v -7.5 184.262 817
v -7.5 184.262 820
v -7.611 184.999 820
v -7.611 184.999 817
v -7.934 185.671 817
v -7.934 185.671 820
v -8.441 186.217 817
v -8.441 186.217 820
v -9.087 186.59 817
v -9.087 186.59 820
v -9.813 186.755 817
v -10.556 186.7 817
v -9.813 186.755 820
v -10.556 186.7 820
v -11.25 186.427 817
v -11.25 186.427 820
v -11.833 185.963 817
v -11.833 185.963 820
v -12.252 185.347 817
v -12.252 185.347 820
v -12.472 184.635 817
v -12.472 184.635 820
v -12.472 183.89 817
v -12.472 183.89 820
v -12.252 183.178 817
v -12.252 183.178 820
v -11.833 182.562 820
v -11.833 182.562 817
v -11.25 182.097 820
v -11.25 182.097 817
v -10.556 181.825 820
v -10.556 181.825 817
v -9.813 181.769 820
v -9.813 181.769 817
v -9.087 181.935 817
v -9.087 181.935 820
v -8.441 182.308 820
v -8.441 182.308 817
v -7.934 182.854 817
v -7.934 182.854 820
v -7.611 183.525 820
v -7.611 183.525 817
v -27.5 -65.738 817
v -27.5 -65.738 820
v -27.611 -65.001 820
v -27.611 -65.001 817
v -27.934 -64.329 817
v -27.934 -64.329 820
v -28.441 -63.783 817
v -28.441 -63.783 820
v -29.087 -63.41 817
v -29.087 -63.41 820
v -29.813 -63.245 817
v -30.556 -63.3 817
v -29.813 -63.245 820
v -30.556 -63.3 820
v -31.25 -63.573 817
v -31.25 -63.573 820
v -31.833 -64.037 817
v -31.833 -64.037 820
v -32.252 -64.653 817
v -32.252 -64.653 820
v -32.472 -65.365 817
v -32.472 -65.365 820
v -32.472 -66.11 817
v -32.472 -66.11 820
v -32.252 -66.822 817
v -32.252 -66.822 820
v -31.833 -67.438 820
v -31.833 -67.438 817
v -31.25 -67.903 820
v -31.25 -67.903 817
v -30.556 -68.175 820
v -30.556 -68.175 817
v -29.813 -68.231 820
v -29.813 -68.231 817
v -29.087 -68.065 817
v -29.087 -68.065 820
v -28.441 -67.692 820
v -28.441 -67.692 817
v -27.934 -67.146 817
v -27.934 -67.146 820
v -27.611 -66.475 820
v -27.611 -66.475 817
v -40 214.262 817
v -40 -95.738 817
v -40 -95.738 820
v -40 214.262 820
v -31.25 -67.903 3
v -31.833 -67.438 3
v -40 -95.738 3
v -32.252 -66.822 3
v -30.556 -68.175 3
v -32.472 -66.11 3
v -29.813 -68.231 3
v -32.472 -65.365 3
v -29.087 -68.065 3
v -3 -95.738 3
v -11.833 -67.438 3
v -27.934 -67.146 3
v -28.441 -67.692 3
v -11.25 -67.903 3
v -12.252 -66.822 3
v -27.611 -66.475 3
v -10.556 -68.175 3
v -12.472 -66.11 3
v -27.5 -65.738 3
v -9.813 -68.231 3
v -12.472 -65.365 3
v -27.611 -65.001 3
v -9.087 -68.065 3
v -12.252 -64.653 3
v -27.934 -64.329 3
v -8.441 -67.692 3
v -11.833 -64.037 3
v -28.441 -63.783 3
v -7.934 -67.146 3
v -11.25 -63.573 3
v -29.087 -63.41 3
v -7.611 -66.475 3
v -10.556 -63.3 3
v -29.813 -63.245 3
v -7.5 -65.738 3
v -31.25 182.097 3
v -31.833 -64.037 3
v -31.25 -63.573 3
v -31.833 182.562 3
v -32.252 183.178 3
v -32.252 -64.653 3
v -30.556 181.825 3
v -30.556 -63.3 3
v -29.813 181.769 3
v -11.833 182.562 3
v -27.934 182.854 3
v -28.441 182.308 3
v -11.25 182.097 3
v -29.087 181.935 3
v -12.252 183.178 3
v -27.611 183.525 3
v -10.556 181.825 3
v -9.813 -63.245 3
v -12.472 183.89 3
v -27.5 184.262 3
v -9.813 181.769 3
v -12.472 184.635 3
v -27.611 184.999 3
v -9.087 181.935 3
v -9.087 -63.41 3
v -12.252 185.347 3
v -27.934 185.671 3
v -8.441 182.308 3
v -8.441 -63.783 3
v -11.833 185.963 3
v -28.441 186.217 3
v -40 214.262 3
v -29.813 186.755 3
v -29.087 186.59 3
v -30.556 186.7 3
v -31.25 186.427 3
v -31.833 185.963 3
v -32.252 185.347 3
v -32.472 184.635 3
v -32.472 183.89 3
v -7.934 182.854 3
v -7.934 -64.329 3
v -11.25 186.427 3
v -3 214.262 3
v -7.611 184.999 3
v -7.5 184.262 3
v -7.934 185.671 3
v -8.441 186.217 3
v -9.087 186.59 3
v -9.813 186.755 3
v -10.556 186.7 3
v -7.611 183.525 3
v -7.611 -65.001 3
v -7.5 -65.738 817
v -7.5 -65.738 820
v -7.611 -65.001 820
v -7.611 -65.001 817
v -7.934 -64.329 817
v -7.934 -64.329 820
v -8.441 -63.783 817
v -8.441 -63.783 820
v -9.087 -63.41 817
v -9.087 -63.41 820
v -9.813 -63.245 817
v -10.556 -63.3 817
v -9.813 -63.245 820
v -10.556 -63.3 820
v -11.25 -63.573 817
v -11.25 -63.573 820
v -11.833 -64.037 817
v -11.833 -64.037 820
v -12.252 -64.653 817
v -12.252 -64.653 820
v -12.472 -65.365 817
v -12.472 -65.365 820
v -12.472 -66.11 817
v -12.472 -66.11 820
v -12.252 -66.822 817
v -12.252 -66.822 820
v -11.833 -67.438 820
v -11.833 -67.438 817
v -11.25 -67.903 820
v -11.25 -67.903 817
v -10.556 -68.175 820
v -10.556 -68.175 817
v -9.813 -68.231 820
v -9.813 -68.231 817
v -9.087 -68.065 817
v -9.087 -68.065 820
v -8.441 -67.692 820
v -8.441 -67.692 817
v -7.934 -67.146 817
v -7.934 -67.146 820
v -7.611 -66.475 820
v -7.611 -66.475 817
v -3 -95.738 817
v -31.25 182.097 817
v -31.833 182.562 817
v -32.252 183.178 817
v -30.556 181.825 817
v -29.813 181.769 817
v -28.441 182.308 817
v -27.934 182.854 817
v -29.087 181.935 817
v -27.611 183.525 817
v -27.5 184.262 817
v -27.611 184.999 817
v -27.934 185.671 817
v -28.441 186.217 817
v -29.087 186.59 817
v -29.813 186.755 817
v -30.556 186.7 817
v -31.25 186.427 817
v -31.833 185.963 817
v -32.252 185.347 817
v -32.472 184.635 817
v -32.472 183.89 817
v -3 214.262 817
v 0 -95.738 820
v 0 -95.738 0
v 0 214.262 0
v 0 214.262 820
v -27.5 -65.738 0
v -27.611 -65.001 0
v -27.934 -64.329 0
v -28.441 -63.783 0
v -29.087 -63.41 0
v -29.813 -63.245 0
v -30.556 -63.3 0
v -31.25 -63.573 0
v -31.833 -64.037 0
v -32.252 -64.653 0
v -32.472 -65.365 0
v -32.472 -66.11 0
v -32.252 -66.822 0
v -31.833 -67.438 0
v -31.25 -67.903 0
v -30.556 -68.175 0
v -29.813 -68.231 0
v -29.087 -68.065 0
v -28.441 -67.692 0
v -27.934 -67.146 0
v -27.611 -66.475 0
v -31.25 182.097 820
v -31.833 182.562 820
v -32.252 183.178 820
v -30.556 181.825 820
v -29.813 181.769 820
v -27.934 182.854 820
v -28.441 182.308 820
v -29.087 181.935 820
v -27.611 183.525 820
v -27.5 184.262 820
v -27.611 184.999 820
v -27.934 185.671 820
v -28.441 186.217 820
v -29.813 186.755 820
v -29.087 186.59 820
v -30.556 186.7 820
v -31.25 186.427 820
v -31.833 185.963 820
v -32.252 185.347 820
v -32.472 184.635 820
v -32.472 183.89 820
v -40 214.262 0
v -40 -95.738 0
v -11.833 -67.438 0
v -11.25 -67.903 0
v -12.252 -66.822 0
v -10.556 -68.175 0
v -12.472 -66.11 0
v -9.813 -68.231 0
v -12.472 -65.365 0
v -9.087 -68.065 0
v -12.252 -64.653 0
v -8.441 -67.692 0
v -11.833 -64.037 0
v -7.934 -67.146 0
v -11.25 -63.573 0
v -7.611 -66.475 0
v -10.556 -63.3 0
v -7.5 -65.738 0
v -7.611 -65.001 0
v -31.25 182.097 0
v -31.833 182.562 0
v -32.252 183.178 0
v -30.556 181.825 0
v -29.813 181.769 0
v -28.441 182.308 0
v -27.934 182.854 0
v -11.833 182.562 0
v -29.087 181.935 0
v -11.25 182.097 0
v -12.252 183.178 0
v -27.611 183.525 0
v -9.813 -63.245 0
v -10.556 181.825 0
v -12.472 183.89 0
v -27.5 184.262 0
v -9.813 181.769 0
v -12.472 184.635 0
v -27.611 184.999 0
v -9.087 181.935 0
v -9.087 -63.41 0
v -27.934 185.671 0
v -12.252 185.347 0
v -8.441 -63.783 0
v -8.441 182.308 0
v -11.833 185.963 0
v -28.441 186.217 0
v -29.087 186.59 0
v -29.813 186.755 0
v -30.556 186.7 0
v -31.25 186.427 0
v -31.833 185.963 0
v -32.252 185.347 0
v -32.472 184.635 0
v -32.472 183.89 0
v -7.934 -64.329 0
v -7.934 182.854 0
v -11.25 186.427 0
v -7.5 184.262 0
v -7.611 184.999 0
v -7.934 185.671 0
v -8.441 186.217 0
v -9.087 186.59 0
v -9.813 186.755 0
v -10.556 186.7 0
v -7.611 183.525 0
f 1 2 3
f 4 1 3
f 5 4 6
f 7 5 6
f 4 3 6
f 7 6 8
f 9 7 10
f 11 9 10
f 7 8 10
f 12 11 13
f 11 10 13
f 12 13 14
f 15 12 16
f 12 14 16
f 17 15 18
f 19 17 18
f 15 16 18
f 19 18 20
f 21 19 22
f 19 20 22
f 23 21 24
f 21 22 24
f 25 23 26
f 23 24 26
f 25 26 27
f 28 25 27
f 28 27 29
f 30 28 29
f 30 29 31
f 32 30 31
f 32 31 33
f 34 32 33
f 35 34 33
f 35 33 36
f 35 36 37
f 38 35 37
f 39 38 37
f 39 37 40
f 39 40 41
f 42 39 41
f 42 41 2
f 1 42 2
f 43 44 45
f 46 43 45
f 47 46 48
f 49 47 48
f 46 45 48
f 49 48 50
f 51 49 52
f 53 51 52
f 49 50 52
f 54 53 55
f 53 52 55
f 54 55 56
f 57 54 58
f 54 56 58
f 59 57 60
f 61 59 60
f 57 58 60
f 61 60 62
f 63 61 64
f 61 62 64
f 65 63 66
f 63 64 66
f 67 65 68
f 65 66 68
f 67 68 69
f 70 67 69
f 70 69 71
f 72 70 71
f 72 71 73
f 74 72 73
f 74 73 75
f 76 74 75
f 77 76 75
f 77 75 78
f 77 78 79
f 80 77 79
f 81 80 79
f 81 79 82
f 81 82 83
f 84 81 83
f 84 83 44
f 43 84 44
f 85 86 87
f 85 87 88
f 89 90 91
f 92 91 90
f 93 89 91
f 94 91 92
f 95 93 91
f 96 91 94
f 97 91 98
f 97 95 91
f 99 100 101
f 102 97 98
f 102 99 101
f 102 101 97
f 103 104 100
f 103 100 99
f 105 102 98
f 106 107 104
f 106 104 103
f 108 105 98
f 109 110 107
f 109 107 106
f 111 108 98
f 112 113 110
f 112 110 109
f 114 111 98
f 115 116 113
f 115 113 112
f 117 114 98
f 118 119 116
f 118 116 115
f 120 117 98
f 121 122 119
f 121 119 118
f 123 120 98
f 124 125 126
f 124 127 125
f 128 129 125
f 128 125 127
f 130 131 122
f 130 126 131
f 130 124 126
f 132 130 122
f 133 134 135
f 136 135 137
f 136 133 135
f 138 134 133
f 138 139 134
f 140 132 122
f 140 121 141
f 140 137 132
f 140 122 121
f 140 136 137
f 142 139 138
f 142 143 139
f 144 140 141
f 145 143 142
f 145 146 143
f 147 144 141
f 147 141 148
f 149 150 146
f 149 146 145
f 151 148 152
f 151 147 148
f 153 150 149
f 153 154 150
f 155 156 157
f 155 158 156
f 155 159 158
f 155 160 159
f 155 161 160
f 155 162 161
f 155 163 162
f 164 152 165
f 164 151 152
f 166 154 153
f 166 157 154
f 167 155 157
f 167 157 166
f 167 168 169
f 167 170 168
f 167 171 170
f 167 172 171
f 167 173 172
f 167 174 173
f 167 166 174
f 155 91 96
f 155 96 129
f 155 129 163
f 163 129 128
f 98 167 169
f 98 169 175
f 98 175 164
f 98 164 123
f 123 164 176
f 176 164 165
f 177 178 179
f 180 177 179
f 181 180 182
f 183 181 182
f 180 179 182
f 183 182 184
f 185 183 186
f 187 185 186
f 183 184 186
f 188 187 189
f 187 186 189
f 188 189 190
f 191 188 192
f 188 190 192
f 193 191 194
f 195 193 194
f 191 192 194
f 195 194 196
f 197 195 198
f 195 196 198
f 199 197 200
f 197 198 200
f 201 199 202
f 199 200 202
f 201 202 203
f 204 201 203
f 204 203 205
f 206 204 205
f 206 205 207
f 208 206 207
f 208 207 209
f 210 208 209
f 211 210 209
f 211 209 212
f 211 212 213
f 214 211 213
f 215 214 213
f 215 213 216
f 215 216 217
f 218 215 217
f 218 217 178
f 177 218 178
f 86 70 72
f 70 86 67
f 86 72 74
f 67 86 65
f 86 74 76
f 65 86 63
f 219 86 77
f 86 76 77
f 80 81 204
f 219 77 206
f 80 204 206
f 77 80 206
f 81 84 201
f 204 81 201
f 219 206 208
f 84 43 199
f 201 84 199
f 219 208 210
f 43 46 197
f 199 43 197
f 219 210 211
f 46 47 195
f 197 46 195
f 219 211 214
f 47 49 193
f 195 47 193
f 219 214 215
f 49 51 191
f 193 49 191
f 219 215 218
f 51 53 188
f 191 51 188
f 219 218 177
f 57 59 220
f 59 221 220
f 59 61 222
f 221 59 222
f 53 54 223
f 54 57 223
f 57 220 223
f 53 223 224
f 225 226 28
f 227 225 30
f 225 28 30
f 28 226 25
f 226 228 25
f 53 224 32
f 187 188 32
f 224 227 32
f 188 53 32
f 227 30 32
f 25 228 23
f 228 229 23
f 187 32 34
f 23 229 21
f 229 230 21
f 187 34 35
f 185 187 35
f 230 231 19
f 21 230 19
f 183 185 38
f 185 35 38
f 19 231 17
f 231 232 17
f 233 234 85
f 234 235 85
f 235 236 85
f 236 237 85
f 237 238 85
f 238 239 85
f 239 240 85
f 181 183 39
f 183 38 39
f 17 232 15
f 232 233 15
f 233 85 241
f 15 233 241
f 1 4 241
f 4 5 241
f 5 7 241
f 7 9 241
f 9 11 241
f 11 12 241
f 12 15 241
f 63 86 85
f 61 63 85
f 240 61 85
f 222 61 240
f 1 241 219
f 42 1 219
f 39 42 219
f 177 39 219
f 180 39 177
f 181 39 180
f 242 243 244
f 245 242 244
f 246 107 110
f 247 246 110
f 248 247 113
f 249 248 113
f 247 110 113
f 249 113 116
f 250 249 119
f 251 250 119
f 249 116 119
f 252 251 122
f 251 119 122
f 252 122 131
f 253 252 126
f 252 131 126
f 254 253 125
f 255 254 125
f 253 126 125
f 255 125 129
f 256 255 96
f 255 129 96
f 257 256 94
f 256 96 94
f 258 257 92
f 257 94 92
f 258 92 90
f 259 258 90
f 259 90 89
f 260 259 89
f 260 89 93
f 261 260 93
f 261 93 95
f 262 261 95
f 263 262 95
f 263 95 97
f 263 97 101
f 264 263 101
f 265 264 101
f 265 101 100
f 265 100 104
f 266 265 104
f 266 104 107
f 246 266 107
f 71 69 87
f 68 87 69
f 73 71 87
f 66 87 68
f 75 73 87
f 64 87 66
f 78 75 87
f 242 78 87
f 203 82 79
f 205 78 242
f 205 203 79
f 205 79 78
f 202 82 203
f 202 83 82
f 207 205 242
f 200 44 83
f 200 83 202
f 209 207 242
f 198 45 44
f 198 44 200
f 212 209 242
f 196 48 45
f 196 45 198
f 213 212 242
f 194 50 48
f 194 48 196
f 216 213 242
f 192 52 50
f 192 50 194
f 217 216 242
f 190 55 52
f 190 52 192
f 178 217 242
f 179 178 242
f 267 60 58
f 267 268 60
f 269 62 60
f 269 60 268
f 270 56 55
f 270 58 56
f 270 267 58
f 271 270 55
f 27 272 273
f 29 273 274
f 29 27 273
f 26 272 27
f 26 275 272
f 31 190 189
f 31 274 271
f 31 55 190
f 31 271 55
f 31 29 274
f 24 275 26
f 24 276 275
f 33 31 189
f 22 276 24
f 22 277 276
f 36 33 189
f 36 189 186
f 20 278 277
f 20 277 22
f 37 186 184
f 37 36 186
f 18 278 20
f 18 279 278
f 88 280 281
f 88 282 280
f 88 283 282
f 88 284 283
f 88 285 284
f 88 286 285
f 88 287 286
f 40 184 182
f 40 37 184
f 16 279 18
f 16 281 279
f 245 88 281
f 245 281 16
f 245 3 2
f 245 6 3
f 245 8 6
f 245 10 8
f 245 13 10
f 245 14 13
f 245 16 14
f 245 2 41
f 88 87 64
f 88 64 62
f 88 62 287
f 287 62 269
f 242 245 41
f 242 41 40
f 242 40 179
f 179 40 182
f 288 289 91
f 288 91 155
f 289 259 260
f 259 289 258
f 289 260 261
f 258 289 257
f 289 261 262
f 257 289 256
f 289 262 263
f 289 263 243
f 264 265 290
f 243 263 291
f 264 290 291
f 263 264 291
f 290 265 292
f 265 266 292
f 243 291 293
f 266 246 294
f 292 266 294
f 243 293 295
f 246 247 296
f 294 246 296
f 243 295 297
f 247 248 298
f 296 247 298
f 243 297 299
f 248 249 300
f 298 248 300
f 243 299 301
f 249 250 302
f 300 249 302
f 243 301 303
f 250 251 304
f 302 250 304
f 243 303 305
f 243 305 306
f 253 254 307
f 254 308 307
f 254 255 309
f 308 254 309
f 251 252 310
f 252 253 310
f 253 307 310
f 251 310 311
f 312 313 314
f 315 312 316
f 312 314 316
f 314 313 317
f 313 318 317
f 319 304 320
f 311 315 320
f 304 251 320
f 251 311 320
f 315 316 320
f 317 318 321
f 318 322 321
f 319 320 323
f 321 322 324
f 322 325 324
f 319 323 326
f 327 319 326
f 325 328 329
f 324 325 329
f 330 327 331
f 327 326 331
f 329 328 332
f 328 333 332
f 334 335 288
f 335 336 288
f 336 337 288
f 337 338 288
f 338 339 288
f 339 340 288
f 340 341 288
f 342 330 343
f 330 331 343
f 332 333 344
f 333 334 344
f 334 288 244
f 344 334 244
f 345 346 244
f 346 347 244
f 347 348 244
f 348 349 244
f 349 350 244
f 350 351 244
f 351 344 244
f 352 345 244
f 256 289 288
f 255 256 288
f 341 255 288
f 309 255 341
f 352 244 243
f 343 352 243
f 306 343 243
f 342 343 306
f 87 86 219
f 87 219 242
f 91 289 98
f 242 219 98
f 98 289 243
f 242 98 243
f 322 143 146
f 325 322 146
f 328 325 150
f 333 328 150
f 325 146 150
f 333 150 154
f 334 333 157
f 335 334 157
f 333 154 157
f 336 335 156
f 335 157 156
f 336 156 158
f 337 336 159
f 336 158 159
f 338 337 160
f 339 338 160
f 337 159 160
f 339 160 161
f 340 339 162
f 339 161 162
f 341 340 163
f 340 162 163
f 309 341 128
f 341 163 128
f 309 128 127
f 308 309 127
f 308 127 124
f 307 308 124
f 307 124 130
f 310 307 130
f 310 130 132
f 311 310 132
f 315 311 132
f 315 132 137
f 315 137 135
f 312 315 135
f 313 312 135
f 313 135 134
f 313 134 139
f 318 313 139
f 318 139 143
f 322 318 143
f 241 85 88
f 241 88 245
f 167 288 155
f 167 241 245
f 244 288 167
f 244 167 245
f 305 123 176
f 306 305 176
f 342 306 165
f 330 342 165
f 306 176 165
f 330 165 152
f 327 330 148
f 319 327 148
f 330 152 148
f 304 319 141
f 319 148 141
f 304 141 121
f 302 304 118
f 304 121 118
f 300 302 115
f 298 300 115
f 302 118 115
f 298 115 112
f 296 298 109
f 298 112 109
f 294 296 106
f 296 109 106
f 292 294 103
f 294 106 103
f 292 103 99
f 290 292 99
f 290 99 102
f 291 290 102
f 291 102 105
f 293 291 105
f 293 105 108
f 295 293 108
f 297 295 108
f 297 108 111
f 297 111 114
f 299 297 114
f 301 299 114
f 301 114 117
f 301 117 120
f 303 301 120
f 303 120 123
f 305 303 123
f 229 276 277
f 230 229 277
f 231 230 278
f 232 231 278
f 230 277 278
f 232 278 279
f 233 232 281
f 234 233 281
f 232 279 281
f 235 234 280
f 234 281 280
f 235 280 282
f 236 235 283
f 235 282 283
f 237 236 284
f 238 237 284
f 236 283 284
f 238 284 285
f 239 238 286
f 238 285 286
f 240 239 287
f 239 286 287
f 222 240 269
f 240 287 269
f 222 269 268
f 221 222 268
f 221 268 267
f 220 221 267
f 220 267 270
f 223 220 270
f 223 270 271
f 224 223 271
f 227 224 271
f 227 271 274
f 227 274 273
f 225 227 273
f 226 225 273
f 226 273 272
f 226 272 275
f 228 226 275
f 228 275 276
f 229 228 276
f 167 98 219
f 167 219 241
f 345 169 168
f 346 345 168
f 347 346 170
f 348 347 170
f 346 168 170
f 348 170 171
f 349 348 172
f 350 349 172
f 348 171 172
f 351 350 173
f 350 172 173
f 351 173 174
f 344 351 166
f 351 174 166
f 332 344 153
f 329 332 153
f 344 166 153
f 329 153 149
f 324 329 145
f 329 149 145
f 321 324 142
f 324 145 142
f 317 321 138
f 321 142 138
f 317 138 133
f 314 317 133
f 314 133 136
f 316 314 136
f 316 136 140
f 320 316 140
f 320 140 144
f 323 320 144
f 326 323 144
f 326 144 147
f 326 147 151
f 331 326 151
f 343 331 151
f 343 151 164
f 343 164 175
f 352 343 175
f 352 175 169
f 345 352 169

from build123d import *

# Parameters (mm, degrees)
F0_W     = 40
F0_H     = 310
F1_DEPTH = 820
F2_T     = -3
F3_R     = 2.5
F4_DEPTH = 820.001


with BuildPart() as f1:
    # F0 (on Top) → F1 (new body)
    with BuildSketch(Plane.XY):
        with Locations((-20, 59.262322)):
            Rectangle(F0_W, F0_H)
    extrude(amount=F1_DEPTH)

    # F2
    f2_openings = [f1.faces().sort_by_distance(p)[0] for p in [
        (-20, 214.262322, 410),
        (-20, -95.737678, 410),
        (-40, 59.262322, 410),
    ]]
    offset(amount=F2_T, openings=f2_openings)

    # F3 (on face) → F4 (cut, through all)
    with BuildSketch(Plane.XY.offset(820)):
        with Locations((-30, 184.262322)):
            Circle(F3_R)
        with Locations((-10, 184.262322)):
            Circle(F3_R)
        with Locations((-30, -65.737678)):
            Circle(F3_R)
        with Locations((-10, -65.737678)):
            Circle(F3_R)
    extrude(amount=-F4_DEPTH, mode=Mode.SUBTRACT)


solid = f1.part
